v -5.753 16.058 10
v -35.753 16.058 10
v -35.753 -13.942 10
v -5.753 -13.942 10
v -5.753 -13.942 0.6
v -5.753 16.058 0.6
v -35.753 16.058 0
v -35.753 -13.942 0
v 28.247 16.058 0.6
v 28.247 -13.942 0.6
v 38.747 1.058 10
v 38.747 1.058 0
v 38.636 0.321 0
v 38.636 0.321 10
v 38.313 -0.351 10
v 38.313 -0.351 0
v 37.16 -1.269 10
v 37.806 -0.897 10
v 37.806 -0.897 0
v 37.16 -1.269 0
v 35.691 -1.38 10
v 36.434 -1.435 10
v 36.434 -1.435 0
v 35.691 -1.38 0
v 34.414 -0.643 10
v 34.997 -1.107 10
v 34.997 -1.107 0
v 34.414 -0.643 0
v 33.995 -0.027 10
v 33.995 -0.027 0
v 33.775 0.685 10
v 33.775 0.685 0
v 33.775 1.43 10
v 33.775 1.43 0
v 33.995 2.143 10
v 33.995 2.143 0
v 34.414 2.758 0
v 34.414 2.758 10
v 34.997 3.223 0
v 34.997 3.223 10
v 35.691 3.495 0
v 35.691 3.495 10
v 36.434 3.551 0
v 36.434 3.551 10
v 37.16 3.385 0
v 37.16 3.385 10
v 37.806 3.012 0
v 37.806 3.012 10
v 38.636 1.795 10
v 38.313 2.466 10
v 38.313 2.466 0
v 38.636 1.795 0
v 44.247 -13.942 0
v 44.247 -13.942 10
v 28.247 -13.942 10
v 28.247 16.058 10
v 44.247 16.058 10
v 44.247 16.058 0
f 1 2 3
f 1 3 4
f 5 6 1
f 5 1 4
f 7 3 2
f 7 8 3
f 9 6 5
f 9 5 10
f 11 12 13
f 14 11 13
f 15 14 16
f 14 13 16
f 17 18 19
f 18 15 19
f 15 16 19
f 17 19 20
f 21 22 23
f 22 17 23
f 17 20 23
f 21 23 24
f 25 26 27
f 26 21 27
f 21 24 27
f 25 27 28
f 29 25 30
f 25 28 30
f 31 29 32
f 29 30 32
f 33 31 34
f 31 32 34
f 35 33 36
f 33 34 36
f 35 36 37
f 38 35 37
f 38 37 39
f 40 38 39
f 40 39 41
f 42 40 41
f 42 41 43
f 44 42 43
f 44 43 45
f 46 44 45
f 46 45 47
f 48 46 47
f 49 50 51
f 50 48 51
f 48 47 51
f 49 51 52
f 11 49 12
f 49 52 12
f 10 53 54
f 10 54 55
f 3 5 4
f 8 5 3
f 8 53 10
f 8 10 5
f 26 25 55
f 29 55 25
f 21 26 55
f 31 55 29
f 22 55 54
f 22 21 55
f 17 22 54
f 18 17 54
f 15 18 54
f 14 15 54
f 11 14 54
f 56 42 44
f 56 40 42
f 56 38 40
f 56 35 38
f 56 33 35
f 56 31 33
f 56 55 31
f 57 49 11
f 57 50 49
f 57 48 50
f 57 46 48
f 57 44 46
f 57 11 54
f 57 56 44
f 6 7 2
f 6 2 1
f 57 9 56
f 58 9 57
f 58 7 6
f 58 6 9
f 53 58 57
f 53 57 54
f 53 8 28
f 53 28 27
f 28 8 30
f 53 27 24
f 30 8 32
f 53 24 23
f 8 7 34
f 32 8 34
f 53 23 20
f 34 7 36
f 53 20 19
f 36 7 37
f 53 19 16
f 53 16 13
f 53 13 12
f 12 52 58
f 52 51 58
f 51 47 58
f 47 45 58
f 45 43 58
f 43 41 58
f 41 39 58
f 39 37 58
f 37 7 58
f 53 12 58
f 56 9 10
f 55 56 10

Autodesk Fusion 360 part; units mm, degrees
sketch "Schizzo1" plane through (0, 0, 0) normal (0, 0, 1) x (1, 0, 0)
  line L0 (-35.7529, 16.0578) -> (-5.7529, 16.0578)
  line L1 (-5.7529, 16.0578) -> (-5.7529, -13.9422)
  line L2 (-5.7529, -13.9422) -> (-35.7529, -13.9422)
  line L3 (-35.7529, -13.9422) -> (-35.7529, 16.0578)
  line L4 (-5.7529, 16.0578) -> (44.2471, 16.0578)
  line L5 (44.2471, 16.0578) -> (44.2471, -13.9422)
  line L6 (44.2471, -13.9422) -> (-5.7529, -13.9422)
  line L7 (36.2471, 16.0578) -> (36.2471, -13.9422) construction
  line L8 (44.2471, 1.0578) -> (-5.7529, 1.0578) construction
  circle A0 centre (36.2471, 1.0578) radius 2.5
  line L9 (28.2471, 16.0578) -> (28.2471, -13.9422)
  line L10 (6.9284, 1.1522) -> (17.2791, 1.0578) construction
  line L11 (17.2791, 1.0578) -> (17.3507, 8.9056) construction
  line L12 (17.3507, 8.9056) -> (7, 9) construction
  line L13 (7, 9) -> (6.9284, 1.1522) construction
  dimension "d1" = 30
  dimension "d2" = 30
  dimension "d3" = 50
  dimension "d4" = 30
  dimension "d5" = 8
  dimension "d6" = 5
  dimension "d13" = 8
  dimension "d14" = 10
  dimension "d15" = 0
  dimension "d21" = 80
extrude "Estrusione1" add sketch "Schizzo1" along normal blind 10 contours L0 L1 L2 L3
extrude "Estrusione2" add sketch "Schizzo1" along normal blind 0.6 contours L1 L4 L6 L9
extrude "Estrusione3" add sketch "Schizzo1" along normal up to surface (10 mm away) contours L4 L5 L6 L9
extrude "Estrusione4" [suppressed]
extrude "Estrusione5" [suppressed]
equation "d13 = d5"
equation "d15 = '10.0'"
